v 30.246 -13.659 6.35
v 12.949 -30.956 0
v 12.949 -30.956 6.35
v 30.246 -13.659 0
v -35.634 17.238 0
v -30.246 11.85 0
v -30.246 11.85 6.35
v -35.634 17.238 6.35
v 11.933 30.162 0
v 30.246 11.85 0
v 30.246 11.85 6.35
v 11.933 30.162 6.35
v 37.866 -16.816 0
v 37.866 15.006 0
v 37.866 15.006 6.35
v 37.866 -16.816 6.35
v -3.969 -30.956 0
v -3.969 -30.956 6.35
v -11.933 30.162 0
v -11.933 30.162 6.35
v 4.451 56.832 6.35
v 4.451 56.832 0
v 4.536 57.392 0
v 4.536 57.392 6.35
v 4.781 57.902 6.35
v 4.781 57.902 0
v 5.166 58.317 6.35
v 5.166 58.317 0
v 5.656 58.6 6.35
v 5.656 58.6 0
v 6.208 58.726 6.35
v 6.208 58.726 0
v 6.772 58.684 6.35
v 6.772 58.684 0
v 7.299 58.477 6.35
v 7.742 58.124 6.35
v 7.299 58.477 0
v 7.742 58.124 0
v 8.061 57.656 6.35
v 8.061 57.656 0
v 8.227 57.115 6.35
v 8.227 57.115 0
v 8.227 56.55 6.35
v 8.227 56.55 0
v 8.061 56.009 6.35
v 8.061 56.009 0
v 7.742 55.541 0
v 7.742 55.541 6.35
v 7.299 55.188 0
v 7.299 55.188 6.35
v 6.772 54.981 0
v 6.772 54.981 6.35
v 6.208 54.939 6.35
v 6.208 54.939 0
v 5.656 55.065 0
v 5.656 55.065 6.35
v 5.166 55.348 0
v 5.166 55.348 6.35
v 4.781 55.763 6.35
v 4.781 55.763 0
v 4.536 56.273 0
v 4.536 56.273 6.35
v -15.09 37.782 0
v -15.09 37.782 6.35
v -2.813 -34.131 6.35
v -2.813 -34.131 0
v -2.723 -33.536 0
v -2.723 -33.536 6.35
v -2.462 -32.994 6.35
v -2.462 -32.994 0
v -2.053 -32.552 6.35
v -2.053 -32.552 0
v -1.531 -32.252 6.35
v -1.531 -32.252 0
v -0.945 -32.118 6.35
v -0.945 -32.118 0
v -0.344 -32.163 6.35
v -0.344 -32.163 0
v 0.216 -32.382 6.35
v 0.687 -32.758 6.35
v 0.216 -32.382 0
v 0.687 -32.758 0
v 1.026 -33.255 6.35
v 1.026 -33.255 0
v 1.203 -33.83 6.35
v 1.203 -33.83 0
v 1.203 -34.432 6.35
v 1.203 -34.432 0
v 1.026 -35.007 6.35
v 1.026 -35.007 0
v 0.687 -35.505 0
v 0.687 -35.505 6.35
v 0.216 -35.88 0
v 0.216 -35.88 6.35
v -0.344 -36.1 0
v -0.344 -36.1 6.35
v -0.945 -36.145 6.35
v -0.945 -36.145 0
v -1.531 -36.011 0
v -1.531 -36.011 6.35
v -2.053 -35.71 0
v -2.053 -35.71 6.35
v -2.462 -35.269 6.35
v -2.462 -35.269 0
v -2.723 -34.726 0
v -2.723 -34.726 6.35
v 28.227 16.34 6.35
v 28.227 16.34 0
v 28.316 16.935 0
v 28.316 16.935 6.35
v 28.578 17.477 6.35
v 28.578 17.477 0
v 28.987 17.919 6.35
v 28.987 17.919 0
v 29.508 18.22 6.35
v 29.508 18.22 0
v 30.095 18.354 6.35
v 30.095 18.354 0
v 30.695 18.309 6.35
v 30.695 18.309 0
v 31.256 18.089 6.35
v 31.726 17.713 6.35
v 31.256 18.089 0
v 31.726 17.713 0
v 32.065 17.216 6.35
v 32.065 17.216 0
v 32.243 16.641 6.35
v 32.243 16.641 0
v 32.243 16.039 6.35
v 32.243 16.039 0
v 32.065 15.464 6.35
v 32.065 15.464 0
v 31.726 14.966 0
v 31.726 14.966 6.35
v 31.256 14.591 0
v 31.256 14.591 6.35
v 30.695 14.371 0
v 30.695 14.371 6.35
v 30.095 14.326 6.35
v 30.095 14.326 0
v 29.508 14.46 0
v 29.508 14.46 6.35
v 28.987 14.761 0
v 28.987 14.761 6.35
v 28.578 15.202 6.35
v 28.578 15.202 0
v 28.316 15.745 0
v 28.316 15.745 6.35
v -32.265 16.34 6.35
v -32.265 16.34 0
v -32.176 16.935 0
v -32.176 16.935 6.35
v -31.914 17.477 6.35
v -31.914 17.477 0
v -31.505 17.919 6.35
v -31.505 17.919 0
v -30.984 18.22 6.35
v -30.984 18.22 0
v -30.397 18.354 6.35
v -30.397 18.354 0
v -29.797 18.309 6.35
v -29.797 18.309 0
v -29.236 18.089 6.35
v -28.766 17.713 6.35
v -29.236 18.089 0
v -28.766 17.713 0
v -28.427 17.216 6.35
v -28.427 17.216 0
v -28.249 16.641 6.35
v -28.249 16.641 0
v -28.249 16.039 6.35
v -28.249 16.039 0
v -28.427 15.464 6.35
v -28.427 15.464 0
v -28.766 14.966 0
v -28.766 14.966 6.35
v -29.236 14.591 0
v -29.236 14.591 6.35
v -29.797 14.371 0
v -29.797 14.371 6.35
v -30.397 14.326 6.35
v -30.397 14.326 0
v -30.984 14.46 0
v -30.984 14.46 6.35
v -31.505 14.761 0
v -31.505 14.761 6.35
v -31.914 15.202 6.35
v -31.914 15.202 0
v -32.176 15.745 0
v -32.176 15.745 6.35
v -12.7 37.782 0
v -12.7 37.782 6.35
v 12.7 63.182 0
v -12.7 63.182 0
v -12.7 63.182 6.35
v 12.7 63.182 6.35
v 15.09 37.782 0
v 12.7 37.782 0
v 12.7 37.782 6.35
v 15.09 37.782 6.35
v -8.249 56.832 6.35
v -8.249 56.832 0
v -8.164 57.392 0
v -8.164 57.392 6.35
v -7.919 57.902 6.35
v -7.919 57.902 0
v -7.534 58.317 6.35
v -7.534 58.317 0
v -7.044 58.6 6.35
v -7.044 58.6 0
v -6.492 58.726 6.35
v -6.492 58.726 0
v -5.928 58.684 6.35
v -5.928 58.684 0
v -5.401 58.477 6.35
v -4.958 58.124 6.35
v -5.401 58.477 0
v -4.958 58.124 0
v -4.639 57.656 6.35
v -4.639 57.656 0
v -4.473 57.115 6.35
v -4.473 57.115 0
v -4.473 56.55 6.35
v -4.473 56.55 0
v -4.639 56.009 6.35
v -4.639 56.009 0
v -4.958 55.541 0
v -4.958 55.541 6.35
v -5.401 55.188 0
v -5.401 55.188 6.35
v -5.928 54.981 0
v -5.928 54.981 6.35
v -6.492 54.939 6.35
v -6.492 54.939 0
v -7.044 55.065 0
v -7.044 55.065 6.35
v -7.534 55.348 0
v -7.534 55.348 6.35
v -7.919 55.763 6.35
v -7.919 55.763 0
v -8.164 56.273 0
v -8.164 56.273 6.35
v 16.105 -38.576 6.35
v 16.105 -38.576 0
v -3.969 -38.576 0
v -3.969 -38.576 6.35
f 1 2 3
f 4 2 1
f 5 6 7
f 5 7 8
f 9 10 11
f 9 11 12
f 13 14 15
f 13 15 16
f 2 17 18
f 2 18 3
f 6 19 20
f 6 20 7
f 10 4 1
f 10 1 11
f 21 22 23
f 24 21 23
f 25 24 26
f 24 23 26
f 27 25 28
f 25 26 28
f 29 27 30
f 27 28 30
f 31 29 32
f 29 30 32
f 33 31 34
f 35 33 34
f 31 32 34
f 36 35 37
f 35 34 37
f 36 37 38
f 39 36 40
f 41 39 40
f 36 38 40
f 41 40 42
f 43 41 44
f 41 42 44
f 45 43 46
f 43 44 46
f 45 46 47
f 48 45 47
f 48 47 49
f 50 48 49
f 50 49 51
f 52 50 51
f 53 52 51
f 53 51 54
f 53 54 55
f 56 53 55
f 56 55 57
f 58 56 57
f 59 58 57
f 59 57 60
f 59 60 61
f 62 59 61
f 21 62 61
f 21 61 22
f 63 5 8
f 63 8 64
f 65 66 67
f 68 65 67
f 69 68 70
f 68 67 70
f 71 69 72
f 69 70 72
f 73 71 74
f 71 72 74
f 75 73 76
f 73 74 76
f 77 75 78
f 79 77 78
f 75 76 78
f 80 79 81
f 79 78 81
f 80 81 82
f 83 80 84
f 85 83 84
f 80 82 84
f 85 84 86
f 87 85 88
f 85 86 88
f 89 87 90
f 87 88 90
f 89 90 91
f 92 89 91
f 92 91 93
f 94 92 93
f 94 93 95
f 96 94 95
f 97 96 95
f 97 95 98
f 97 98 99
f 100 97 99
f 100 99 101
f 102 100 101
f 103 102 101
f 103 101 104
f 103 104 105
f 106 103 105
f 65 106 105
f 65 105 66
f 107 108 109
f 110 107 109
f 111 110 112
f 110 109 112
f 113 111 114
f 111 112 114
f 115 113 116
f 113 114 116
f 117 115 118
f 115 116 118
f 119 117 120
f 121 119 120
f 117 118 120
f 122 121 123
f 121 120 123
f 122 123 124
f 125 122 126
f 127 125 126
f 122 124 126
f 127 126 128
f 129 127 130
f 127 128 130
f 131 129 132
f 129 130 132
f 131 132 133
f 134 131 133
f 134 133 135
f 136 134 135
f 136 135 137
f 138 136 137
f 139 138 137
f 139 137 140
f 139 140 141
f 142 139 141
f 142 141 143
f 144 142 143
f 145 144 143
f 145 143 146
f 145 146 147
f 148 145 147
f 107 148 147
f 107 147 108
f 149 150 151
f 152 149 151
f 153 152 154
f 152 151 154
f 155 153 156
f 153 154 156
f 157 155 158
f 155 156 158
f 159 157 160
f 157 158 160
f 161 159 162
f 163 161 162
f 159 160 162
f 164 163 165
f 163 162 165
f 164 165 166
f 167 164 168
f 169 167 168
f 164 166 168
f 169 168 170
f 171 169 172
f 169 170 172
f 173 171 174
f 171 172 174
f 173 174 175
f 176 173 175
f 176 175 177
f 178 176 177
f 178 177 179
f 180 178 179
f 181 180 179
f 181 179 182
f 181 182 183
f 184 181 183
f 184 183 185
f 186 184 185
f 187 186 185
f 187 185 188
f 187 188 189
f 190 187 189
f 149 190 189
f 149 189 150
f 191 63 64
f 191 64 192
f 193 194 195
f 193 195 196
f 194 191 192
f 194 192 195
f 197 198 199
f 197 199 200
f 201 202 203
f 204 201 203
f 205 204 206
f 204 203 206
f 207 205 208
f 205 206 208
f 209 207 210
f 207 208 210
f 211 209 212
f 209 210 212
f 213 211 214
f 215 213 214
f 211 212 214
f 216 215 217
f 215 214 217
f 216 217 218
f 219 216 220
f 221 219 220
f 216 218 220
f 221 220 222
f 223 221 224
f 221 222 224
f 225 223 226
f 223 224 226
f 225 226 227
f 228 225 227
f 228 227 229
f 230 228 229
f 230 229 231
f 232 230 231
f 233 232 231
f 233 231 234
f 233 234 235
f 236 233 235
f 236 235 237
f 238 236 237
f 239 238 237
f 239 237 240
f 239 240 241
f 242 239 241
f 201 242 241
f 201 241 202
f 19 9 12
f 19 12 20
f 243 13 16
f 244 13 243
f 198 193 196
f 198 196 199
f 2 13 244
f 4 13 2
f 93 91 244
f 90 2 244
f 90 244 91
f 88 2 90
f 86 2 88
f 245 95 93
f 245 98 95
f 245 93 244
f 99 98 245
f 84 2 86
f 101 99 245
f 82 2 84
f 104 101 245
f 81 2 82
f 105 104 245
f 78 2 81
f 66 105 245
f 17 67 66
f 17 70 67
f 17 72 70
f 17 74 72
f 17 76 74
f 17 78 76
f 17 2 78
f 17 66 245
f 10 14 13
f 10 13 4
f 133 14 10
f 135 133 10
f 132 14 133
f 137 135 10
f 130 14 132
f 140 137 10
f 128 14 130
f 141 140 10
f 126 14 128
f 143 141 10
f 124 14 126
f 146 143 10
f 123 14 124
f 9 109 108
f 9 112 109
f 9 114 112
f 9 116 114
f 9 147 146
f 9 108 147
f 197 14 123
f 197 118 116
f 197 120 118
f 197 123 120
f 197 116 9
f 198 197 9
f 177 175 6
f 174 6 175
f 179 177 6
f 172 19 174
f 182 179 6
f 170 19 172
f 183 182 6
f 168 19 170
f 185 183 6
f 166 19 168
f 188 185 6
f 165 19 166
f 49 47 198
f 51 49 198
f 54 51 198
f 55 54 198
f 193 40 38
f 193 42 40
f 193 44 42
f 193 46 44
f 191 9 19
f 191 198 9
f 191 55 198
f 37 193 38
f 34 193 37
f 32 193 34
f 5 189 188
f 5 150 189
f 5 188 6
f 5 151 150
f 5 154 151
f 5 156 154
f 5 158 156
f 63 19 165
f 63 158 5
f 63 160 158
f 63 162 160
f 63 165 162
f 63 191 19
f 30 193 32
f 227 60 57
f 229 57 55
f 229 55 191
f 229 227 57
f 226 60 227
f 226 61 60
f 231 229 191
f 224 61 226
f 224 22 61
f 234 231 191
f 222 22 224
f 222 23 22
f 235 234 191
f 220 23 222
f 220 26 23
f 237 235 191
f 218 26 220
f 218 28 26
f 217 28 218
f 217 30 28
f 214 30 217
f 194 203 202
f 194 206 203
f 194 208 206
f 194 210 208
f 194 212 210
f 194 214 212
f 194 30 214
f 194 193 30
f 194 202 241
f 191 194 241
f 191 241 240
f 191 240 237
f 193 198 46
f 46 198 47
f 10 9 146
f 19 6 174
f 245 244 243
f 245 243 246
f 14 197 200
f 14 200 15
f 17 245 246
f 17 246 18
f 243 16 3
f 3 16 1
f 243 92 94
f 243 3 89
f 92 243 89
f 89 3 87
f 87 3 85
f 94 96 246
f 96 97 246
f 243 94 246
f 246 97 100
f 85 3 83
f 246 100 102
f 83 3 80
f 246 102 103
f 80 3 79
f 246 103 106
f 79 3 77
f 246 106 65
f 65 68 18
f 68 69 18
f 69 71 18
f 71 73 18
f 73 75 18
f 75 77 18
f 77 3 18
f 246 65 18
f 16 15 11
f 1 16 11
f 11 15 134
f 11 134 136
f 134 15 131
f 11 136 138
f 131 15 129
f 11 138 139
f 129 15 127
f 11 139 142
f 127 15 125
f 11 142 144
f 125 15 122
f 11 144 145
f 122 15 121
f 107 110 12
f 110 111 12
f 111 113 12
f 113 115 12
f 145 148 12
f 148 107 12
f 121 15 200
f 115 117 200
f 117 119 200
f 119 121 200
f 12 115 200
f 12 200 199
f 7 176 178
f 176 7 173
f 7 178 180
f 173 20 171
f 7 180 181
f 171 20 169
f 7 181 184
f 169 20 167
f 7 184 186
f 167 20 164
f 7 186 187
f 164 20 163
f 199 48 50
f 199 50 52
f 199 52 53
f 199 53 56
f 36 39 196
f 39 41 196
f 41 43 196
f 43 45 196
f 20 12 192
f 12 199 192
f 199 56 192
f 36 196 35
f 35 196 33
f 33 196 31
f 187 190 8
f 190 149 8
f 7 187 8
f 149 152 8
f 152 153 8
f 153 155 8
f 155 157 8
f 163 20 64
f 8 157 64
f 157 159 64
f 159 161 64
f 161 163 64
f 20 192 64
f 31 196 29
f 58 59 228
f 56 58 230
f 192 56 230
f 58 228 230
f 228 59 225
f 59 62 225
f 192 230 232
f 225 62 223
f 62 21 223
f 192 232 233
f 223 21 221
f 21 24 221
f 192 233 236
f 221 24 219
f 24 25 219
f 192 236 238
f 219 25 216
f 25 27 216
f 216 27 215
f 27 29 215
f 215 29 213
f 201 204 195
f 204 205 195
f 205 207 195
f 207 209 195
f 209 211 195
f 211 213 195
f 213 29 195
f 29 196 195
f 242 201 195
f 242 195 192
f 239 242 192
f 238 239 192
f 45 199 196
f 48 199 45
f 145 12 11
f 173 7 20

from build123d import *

# Parameters (mm, degrees)
BOSS_EXTRUDE1_DEPTH    = 6.35
F_10_32_TAPPED_HOLE1_D = 4.0386
F_10_32_TAPPED_HOLE2_D = 4.0386
F_6_CLEARANCE_HOLE1_D  = 3.7973


with BuildPart() as part:
    # Sketch1 → Boss-Extrude1 (new body)
    with BuildSketch(Plane.XY):
        Polygon((-35.6340909, 17.237993597), (-15.089584497, 37.7825), (-12.7, 37.7825), (-12.7, 63.1825), (12.7, 63.1825), (12.7, 37.7825), (15.089584497, 37.7825), (37.865937227, 15.00614727), (37.865937227, -16.815626239), (16.105313466, -38.57625), (-3.96875, -38.57625), (-3.96875, -30.95625), (12.949006121, -30.95625), (30.245937227, -13.659318894), (30.245937227, 11.849839924), (11.933277152, 30.1625), (-11.933277152, 30.1625), (-30.245937227, 11.849839924), align=None)
    extrude(amount=BOSS_EXTRUDE1_DEPTH)

    # #10-32 Tapped Hole1 (through all)
    with Locations(Plane.XY.offset(6.35)):
        with Locations((-30.245937227, 16.339967985)):
            Hole(F_10_32_TAPPED_HOLE1_D / 2)

    # #10-32 Tapped Hole2 (through all)
    with Locations(Plane.XY.offset(6.35)):
        with Locations((30.245937227, 16.339967985), (-0.79375, -34.13125)):
            Hole(F_10_32_TAPPED_HOLE2_D / 2)

    # #6 Clearance Hole1 (through all)
    with Locations(Plane(origin=(-6.35, 56.8325, 6.35), x_dir=(1, 0, 0), z_dir=(0, 0, 1))):
        with Locations((0, 0), (12.7, 0)):
            Hole(F_6_CLEARANCE_HOLE1_D / 2)


solid = part.part
